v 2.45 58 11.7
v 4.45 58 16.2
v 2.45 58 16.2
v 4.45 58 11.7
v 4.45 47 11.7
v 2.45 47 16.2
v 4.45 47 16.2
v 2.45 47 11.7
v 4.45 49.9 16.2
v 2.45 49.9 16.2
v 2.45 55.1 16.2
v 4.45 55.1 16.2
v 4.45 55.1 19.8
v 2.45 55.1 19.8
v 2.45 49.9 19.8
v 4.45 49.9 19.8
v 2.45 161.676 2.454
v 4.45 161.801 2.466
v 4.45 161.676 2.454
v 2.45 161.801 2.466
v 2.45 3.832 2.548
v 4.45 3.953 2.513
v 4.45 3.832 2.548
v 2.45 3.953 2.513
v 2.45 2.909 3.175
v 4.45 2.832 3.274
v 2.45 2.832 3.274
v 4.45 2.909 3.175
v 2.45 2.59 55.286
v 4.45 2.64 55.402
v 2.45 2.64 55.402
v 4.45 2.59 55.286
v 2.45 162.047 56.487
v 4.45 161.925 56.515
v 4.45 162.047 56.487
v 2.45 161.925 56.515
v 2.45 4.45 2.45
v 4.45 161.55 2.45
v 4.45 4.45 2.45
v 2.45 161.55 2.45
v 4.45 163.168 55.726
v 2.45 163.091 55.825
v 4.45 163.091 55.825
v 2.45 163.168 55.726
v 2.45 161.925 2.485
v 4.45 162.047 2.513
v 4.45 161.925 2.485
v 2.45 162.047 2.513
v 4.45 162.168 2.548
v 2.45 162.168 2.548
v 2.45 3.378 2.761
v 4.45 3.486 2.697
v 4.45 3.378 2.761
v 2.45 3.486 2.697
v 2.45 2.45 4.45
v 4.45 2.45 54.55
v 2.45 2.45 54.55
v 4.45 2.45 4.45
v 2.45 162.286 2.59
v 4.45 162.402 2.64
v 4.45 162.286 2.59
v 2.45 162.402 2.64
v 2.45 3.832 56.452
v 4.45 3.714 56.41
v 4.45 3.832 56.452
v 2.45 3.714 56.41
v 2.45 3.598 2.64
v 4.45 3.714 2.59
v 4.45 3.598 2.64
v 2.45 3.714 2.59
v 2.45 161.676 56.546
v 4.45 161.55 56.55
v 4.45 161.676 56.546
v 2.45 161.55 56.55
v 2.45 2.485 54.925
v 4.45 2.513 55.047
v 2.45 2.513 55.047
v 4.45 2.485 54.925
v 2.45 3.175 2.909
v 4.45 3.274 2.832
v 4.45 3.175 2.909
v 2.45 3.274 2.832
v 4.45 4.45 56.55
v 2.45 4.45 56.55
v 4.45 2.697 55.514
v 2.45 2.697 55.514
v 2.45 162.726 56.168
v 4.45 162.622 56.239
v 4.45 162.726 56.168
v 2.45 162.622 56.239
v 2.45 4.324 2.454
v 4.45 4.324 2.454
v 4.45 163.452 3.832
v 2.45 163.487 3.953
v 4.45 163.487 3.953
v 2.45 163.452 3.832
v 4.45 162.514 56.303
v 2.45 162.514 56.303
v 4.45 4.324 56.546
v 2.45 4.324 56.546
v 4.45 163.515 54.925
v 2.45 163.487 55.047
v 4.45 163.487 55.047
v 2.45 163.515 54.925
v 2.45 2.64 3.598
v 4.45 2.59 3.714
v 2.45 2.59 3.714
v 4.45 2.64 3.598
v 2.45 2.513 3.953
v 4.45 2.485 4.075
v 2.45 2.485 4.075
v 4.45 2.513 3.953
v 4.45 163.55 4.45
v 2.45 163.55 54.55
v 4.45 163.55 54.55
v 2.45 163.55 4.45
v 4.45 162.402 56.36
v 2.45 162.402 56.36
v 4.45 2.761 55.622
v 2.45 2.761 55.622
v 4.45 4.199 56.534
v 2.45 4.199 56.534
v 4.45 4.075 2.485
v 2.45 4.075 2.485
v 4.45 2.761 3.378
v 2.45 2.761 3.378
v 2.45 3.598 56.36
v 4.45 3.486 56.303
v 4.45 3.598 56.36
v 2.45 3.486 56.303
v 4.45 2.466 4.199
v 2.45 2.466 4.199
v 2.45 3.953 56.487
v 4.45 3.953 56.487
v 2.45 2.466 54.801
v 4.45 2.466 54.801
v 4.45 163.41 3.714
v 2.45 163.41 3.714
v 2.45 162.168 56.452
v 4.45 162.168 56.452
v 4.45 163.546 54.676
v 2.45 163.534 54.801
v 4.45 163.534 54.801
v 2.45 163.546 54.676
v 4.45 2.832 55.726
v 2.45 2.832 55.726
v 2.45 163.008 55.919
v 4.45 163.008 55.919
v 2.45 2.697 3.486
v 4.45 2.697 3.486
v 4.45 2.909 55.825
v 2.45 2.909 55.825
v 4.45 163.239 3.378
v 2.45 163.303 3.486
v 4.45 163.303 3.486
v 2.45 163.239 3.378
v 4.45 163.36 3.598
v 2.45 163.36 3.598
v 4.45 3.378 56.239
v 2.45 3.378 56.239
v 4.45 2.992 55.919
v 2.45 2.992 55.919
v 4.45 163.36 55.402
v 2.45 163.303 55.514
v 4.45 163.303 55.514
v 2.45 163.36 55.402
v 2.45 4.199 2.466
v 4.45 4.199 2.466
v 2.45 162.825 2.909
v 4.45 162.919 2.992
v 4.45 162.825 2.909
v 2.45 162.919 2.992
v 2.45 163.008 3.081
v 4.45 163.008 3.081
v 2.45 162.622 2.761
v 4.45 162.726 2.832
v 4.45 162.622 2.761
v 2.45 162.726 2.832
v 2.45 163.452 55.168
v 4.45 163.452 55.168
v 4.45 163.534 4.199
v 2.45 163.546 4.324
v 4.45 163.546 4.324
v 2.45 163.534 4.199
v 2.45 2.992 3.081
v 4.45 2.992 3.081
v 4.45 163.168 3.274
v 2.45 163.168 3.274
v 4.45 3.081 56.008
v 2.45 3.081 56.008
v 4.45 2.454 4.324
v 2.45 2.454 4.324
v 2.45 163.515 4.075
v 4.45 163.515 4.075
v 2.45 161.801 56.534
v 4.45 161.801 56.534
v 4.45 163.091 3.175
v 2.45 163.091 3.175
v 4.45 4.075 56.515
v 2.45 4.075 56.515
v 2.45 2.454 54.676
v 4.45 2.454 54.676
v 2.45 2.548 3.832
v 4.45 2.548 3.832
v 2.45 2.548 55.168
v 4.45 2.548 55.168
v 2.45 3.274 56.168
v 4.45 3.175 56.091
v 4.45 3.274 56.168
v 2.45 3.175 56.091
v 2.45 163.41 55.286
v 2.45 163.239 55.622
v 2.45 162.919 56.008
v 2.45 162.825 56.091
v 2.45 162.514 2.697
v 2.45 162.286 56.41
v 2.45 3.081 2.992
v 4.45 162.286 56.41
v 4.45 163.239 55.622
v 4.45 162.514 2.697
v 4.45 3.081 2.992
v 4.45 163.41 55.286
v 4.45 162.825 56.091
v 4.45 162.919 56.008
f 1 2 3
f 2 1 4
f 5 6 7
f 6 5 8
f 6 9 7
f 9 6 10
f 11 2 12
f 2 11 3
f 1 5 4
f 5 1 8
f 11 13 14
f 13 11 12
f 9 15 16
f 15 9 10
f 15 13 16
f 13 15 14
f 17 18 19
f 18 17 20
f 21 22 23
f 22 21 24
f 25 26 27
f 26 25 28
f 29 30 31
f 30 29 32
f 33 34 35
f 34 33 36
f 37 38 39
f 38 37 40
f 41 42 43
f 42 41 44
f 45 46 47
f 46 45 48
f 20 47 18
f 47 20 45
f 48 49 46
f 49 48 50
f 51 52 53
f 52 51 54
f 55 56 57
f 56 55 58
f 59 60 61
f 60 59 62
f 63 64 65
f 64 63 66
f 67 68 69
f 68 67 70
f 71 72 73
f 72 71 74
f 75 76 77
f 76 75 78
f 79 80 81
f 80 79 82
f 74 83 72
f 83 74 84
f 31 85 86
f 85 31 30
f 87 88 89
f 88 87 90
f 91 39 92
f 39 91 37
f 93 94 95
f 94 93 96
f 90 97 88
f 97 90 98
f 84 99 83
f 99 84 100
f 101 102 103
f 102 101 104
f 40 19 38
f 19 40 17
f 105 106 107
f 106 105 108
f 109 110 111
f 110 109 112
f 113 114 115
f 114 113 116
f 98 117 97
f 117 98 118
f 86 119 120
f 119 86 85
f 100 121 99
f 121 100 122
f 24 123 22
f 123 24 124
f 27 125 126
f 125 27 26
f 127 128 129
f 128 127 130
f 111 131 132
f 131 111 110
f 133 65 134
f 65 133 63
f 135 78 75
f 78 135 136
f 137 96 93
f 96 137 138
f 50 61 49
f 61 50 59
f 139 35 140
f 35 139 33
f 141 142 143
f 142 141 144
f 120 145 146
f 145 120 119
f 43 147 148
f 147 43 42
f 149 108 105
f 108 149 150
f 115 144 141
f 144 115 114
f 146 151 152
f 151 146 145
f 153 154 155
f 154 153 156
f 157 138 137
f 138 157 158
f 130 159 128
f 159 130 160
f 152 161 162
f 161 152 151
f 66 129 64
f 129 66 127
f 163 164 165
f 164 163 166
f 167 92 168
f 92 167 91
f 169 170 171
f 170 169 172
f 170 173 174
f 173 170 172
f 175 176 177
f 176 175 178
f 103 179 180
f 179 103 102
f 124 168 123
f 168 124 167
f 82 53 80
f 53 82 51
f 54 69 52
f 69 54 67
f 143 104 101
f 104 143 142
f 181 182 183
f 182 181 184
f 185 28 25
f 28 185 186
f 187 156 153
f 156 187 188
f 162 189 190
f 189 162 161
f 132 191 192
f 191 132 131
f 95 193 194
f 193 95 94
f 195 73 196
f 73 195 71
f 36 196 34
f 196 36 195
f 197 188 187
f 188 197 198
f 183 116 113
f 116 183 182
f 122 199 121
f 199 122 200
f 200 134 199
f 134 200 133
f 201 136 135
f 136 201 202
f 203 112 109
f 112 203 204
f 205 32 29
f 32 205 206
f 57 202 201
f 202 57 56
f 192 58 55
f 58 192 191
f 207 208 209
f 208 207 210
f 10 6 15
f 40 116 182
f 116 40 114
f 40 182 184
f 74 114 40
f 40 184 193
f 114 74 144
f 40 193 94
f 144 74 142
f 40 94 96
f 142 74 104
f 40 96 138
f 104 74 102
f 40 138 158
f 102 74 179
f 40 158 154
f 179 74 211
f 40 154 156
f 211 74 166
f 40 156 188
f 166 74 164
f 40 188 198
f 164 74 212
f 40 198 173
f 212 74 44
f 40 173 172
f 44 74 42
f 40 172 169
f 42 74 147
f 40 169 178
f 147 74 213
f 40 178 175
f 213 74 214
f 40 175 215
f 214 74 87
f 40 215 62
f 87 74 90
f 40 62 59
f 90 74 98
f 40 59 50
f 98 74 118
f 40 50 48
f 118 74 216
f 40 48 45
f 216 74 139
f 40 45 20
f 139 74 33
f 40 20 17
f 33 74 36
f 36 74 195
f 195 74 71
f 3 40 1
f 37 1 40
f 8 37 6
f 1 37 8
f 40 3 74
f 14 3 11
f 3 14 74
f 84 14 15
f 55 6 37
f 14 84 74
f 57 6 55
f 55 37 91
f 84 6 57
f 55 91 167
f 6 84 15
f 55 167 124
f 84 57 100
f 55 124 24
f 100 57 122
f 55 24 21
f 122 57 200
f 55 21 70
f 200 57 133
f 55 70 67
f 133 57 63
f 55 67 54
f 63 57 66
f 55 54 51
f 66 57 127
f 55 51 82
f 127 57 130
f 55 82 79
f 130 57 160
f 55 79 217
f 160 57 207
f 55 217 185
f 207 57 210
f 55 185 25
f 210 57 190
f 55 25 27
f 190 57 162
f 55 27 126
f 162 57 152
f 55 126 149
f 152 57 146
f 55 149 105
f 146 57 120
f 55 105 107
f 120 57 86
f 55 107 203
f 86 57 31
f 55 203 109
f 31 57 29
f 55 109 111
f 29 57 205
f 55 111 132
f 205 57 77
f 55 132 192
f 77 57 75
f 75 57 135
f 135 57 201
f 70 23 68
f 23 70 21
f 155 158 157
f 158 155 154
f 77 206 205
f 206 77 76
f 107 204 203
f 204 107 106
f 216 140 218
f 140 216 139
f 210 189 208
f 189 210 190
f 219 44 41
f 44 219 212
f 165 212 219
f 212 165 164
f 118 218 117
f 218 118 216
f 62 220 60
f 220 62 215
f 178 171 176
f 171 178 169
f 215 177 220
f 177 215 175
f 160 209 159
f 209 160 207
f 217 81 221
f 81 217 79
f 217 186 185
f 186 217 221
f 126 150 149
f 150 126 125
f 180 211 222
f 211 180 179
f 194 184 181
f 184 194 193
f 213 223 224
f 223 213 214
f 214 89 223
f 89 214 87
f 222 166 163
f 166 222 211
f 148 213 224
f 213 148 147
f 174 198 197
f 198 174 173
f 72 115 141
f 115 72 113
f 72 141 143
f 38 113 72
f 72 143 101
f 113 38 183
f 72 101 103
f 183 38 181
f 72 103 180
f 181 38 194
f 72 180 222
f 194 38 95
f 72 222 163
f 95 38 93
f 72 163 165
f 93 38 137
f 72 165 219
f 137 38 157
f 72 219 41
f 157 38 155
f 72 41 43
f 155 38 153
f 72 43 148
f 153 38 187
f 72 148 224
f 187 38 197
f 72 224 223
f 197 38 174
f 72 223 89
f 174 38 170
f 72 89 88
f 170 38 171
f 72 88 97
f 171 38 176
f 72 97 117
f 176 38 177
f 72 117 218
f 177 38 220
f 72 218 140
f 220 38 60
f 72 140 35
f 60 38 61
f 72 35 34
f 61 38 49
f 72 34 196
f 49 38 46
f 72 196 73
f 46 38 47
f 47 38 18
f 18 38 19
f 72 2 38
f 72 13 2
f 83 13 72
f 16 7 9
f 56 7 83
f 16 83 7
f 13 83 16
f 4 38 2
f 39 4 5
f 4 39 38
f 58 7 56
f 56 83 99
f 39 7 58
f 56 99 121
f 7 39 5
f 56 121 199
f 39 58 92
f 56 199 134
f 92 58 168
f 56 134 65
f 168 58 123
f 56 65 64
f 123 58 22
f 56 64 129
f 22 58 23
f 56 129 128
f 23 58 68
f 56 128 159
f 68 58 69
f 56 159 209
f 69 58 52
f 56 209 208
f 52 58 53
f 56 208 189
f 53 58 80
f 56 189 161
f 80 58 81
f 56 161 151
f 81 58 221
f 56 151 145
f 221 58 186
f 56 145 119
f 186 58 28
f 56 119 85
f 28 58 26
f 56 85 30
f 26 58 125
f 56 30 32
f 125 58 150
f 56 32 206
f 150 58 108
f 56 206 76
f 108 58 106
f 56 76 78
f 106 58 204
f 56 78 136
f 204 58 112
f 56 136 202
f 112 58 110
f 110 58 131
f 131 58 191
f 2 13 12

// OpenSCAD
// file: csb_connectors.scad
module c13_connector()
{
  // Vydalenost sroubu na EURO konektoru
  power_plug_screws_dist = 36;
  difference()
  {
    cube([27.8,19.8,10],center=true);
    translate([7.5,19.8/2,-10]) rotate([0,0,-45]) cube([20,20,20]);
	  translate([-7.5,19.8/2,-10]) rotate([0,0,135]) cube([20,20,20]);
  }
  // Otvory pro srouby
  translate([power_plug_screws_dist/2,0,0]) cylinder(r=1.2,h=20,$fn=16,center=true);
  translate([-power_plug_screws_dist/2,0,0]) cylinder(r=1.2,h=20,$fn=16,center=true);
  
  //%cube([50,22,10],center=true);
}

module c14_connector()
{
  // Vydalenost sroubu na EURO konektoru
  power_plug_screws_dist = 40;
  difference()
  {
    cube([32.8,24.8,10],center=true);
    translate([9,24.8/2,-10]) rotate([0,0,-45]) cube([20,20,20]);
    translate([-9,24.8/2,-10]) rotate([0,0,135]) cube([20,20,20]);
  }
  // Otvory pro srouby
  translate([power_plug_screws_dist/2,0,0]) cylinder(r=1.2,h=20,$fn=16,center=true);
  translate([-power_plug_screws_dist/2,0,0]) cylinder(r=1.2,h=20,$fn=16,center=true);
  
  //%cube([50,22,10],center=true);
}

module 2p_switch() {
  cube(size=[31, 22.5, 10], center=true);
}

/*
c13_connector();
translate([0, 50, 0]) c14_connector();
translate([0, -50, 0]) 2p_switch();*/
// main file
/*//////////////////////////////////////////////////////////////////
              -    FB Aka Heartman/Hearty 2016     -                   
              -   http://heartygfx.blogspot.com    -                  
              -       OpenScad Parametric Box      -                     
              -         CC BY-NC 3.0 License       -                      
////////////////////////////////////////////////////////////////////                                                                                                             
12/02/2016 - Fixed minor bug 
28/02/2016 - Added holes ventilation option                    
09/03/2016 - Added PCB feet support, fixed the shell artefact on export mode. 

*/////////////////////////// - Info - //////////////////////////////

// All coordinates are starting as integrated circuit pins.
// From the top view :

//   CoordD           <---       CoordC
//                                 ^
//                                 ^
//                                 ^
//   CoordA           --->       CoordB


////////////////////////////////////////////////////////////////////


////////// - Paramètres de la boite - Box parameters - /////////////

/* [Box dimensions] */
// - Longueur - Length  
  Length        = 90;       
// - Largeur - Width
  Width         = 166;                     
// - Hauteur - Height  
  Height        = 59;  
// - Epaisseur - Wall thickness  
  Thick         = 2;//[2:5]  
  
/* [Box options] */
// - Diamètre Coin arrondi - Filet diameter  
  Filet         = 2;//[0.1:12] 
// - lissage de l'arrondi - Filet smoothness  
  Resolution    = 50;//[1:100] 
// - Tolérance - Tolerance (Panel/rails gap)
  m             = 0.9;
// Pieds PCB - PCB feet (x4) 
  PCBFeet       = 0;// [0:No, 1:Yes]
// - Decorations to ventilation holes
  Vent          = 0;// [0:No, 1:Yes]
// - Decoration-Holes width (in mm)
  Vent_width    = 0;   


  
/* [PCB_Feet] */
//All dimensions are from the center foot axis

// - Coin bas gauche - Low left corner X position
PCBPosX         = -2;
// - Coin bas gauche - Low left corner Y position
PCBPosY         = 25;
// - Longueur PCB - PCB Length
PCBLength       = 42.5;
// - Largeur PCB - PCB Width
PCBWidth        = 40;
// - Heuteur pied - Feet height
FootHeight      = 10;
// - Diamètre pied - Foot diameter
FootDia         = 8;
// - Diamètre trou - Hole diameter
FootHole        = 3.5;  
  

/* [STL element to export] */
//Coque haut - Top shell
TShell          = 0;// [0:No, 1:Yes]
//Coque bas- Bottom shell
BShell          = 0;// [0:No, 1:Yes]
//Panneau avant - Front panel
FPanL           = 0;// [0:No, 1:Yes]
//Panneau arrière - Back panel  
BPanL           = 1;// [0:No, 1:Yes]


  
/* [Hidden] */
// - Couleur coque - Shell color  
Couleur1        = "Orange";       
// - Couleur panneaux - Panels color    
Couleur2        = "OrangeRed";    
// Thick X 2 - making decorations thicker if it is a vent to make sure they go through shell
Dec_Thick       = Vent ? Thick*2 : Thick; 
// - Depth decoration
Dec_size        = Vent ? Thick*2 : 0.8;





/////////// - Boitier générique bord arrondis - Generic rounded box - //////////

module RoundBox($a=Length, $b=Width, $c=Height){// Cube bords arrondis
                    $fn=Resolution;            
                    translate([0,Filet,Filet]){  
                    minkowski (){                                              
                        cube ([$a-(Length/2),$b-(2*Filet),$c-(2*Filet)], center = false);
                        rotate([0,90,0]){    
                        cylinder(r=Filet,h=Length/2, center = false);
                            } 
                        }
                    }
                }// End of RoundBox Module

      
////////////////////////////////// - Module Coque/Shell - //////////////////////////////////         

module Coque(){//Coque - Shell  
    Thick = Thick*2;  
    difference(){    
        difference(){//sides decoration
            union(){    
                     difference() {//soustraction de la forme centrale - Substraction Fileted box
                      
                        difference(){//soustraction cube median - Median cube slicer
                            union() {//union               
                            difference(){//Coque    
                                RoundBox();
                                translate([Thick/2,Thick/2,Thick/2]){     
                                        RoundBox($a=Length-Thick, $b=Width-Thick, $c=Height-Thick);
                                        }
                                        }//Fin diff Coque                            
                                difference(){//largeur Rails        
                                     translate([Thick+m,Thick/2,Thick/2]){// Rails
                                          RoundBox($a=Length-((2*Thick)+(2*m)), $b=Width-Thick, $c=Height-(Thick*2));
                                                          }//fin Rails
                                     translate([((Thick+m/2)*1.55),Thick/2,Thick/2+0.1]){ // +0.1 added to avoid the artefact
                                          RoundBox($a=Length-((Thick*3)+2*m), $b=Width-Thick, $c=Height-Thick);
                                                    }           
                                                }//Fin largeur Rails
                                    }//Fin union                                   
                               translate([-Thick,-Thick,Height/2]){// Cube à soustraire
                                    cube ([Length+100, Width+100, Height], center=false);
                                            }                                            
                                      }//fin soustraction cube median - End Median cube slicer
                               translate([-Thick/2,Thick,Thick]){// Forme de soustraction centrale 
                                    RoundBox($a=Length+Thick, $b=Width-Thick*2, $c=Height-Thick);       
                                    }                          
                                }                                          


                difference(){// wall fixation box legs
                    union(){
                        translate([3*Thick +5,Thick,Height/2]){
                            rotate([90,0,0]){
                                    $fn=6;
                                    cylinder(d=16,Thick/2);
                                    }   
                            }
                            
                       translate([Length-((3*Thick)+5),Thick,Height/2]){
                            rotate([90,0,0]){
                                    $fn=6;
                                    cylinder(d=16,Thick/2);
                                    }   
                            }

                        }
                            translate([4,Thick+Filet,Height/2-57]){   
                             rotate([45,0,0]){
                                   cube([Length,40,40]);    
                                  }
                           }
                           translate([0,-(Thick*1.46),Height/2]){
                                cube([Length,Thick*2,10]);
                           }
                    } //Fin fixation box legs
            }

        union(){// outbox sides decorations
            
            for(i=[0:Thick:Length/4]){

                // Ventilation holes part code submitted by Ettie - Thanks ;) 
                    translate([10+i,-Dec_Thick+Dec_size,1]){
                    cube([Vent_width,Dec_Thick,Height/4]);
                    }
                    translate([(Length-10) - i,-Dec_Thick+Dec_size,1]){
                    cube([Vent_width,Dec_Thick,Height/4]);
                    }
                    translate([(Length-10) - i,Width-Dec_size,1]){
                    cube([Vent_width,Dec_Thick,Height/4]);
                    }
                    translate([10+i,Width-Dec_size,1]){
                    cube([Vent_width,Dec_Thick,Height/4]);
                    }
  
                
                    }// fin de for
               // }
                }//fin union decoration
            }//fin difference decoration


            union(){ //sides holes
                $fn=50;
                translate([3*Thick+5,20,Height/2+4]){
                    rotate([90,0,0]){
                    cylinder(d=2,20);
                    }
                }
                translate([Length-((3*Thick)+5),20,Height/2+4]){
                    rotate([90,0,0]){
                    cylinder(d=2,20);
                    }
                }
                translate([3*Thick+5,Width+5,Height/2-4]){
                    rotate([90,0,0]){
                    cylinder(d=2,20);
                    }
                }
                translate([Length-((3*Thick)+5),Width+5,Height/2-4]){
                    rotate([90,0,0]){
                    cylinder(d=2,20);
                    }
                }
            }//fin de sides holes

        }//fin de difference holes
}// fin coque 

////////////////////////////// - Experiment - ///////////////////////////////////////////





/////////////////////// - Foot with base filet - /////////////////////////////
module foot(FootDia,FootHole,FootHeight){
    Filet=2;
    color(Couleur1)   
    translate([0,0,Filet-1.5])
    difference(){
    
    difference(){
            //translate ([0,0,-Thick]){
                cylinder(d=FootDia+Filet,FootHeight-Thick, $fn=100);
                        //}
                    rotate_extrude($fn=100){
                            translate([(FootDia+Filet*2)/2,Filet,0]){
                                    minkowski(){
                                            square(10);
                                            circle(Filet, $fn=100);
                                        }
                                 }
                           }
                   }
            cylinder(d=FootHole,FootHeight+1, $fn=100);
               }          
}// Fin module foot
  
module Feet(){     
//////////////////// - PCB only visible in the preview mode - /////////////////////    
    translate([3*Thick+2,Thick+5,FootHeight+(Thick/2)-0.5]){
    
    %square ([PCBLength,PCBWidth]);
       translate([PCBLength/2,PCBWidth/2,0.5]){ 
        color("Olive")
        %text("PCB", halign="center", valign="center", font="Arial black");
       }
    } // Fin PCB 
  
    
////////////////////////////// - 4 Feet - //////////////////////////////////////////     
    translate([3*Thick+7,Thick+10,Thick/2]){
        foot(FootDia,FootHole,FootHeight);
    }
    translate([(3*Thick)+PCBLength+7,Thick+10,Thick/2]){
        foot(FootDia,FootHole,FootHeight);
        }
    translate([(3*Thick)+PCBLength+7,(Thick)+PCBWidth+10,Thick/2]){
        foot(FootDia,FootHole,FootHeight);
        }        
    translate([3*Thick+7,(Thick)+PCBWidth+10,Thick/2]){
        foot(FootDia,FootHole,FootHeight);
    }   

} // Fin du module Feet
 


 
 ////////////////////////////////////////////////////////////////////////
////////////////////// <- Holes Panel Manager -> ///////////////////////
////////////////////////////////////////////////////////////////////////

//                           <- Panel ->  
module Panel(Length,Width,Thick,Filet){
    scale([0.5,1,1])
    minkowski(){
            cube([Thick,Width-(Thick*2+Filet*2+m),Height-(Thick*2+Filet*2+m)]);
            translate([0,Filet,Filet])
            rotate([0,90,0])
            cylinder(r=Filet,h=Thick, $fn=100);
      }
}



//                          <- Circle hole -> 
// Cx=Cylinder X position | Cy=Cylinder Y position | Cdia= Cylinder dia | Cheight=Cyl height
module CylinderHole(OnOff,Cx,Cy,Cdia){
    if(OnOff==1)
    translate([Cx,Cy,-1])
        cylinder(d=Cdia,10, $fn=50);
}
//                          <- Square hole ->  
// Sx=Square X position | Sy=Square Y position | Sl= Square Length | Sw=Square Width | Filet = Round corner
module SquareHole(OnOff,Sx,Sy,Sl,Sw,Filet){
    if(OnOff==1)
     minkowski(){
        translate([Sx+Filet/2,Sy+Filet/2,-1])
            cube([Sl-Filet,Sw-Filet,10]);
            cylinder(d=Filet,h=10, $fn=100);
       }
}


 
//                      <- Linear text panel -> 
module LText(OnOff,Tx,Ty,Font,Size,Content){
    if(OnOff==1)
    translate([Tx,Ty,Thick+.5])
    linear_extrude(height = 0.5){
    text(Content, size=Size, font=Font);
    }
}
//                     <- Circular text panel->  
module CText(OnOff,Tx,Ty,Font,Size,TxtRadius,Angl,Turn,Content){ 
      if(OnOff==1) {
      Angle = -Angl / len(Content);
      translate([Tx,Ty,Thick+.5])
          for (i= [0:len(Content)-1] ){   
              rotate([0,0,i*Angle+90+Turn])
              translate([0,TxtRadius,0]) {
                linear_extrude(height = 0.5){
                text(Content[i], font = Font, size = Size,  valign ="baseline", halign ="center");
                    }
                }   
             }
      }
}
////////////////////// <- New module Panel -> //////////////////////
module FPanL(){
    include <csb_connectors.scad>
    center=Height-(Thick*2+Filet*2+m)+3;
    difference(){
        color(Couleur2)
        Panel(Length,Width,Thick,Filet);
      
        translate([0, 55, center/2]) rotate(a=[0, 90, 0]) 2p_switch();
    
        translate([0, 22, center/2]) rotate(a=[0, 90, 0]) c13_connector();
        translate([0, 90, center/2]) rotate(a=[0, 90, 0]) c14_connector();
        translate([0, 133, center/2]) rotate(a=[0, 90, 0]) c14_connector();

    
}
    color(Couleur1){
        translate ([0,109,center/2+6])
        rotate([0,90,0]){
//                      <- Adding text from here ->          
        LText(1,0,0,"Arial Black",4,"PSU");
        LText(1,-2,42.5,"Arial Black",4,"PUMP");

            }
      }

    
}

module BPanL() {
  molex_bottom_w = 11;
  molex_bottom_h = 4.5;
  molex_top_w = 5.2;
  molex_top_h = 3.6;

  color(Couleur2)
      //translate([-1, PCBPosY+10-m/2+15.5, FootHeight+1.5]) rotate(a=[-90, 0, 0]) cube(size=[molex_top_w, molex_top_h+molex_bottom_h, 10], center=true);}
      //rotate(a=[90, 0, 90]) cube(size=[molex_bottom_w*2, molex_bottom_h, 10], center=true);

  difference() {
    Panel(Length,Width,Thick,Filet);
    translate([-1, PCBPosY+10-m/2+15.5, FootHeight+1.5]) rotate(a=[90, 0, 90]) {
      cube(size=[molex_bottom_w, molex_bottom_h, 10], center=true);
      translate([0, molex_top_h/2, 0]) cube(size=[molex_top_w, molex_top_h+molex_bottom_h, 10], center=true);
    }

  }
}


/////////////////////////// <- Main part -> /////////////////////////

if(TShell==1)
// Coque haut - Top Shell
        color( Couleur1,1){
            translate([0,Width,Height+0.2]){
                rotate([0,180,180]){
                        Coque();
                        }
                }
        }

if(BShell==1)
// Coque bas - Bottom shell
        color(Couleur1){ 
        Coque();
        }

// Pied support PCB - PCB feet
if (PCBFeet==1)
// Feet
        translate([PCBPosX,PCBPosY,0]){ 
        Feet();
        }

// Panneau avant - Front panel  <<<<<< Text and holes only on this one.
//rotate([0,-90,-90]) 
if(FPanL==1)
        translate([Length-(Thick*2+m/2),Thick+m/2,Thick+m/2])
        FPanL();

//Panneau arrière - Back panel
if(BPanL==1)
        translate([Thick+m/2,Thick+m/2,Thick+m/2])
        BPanL();
